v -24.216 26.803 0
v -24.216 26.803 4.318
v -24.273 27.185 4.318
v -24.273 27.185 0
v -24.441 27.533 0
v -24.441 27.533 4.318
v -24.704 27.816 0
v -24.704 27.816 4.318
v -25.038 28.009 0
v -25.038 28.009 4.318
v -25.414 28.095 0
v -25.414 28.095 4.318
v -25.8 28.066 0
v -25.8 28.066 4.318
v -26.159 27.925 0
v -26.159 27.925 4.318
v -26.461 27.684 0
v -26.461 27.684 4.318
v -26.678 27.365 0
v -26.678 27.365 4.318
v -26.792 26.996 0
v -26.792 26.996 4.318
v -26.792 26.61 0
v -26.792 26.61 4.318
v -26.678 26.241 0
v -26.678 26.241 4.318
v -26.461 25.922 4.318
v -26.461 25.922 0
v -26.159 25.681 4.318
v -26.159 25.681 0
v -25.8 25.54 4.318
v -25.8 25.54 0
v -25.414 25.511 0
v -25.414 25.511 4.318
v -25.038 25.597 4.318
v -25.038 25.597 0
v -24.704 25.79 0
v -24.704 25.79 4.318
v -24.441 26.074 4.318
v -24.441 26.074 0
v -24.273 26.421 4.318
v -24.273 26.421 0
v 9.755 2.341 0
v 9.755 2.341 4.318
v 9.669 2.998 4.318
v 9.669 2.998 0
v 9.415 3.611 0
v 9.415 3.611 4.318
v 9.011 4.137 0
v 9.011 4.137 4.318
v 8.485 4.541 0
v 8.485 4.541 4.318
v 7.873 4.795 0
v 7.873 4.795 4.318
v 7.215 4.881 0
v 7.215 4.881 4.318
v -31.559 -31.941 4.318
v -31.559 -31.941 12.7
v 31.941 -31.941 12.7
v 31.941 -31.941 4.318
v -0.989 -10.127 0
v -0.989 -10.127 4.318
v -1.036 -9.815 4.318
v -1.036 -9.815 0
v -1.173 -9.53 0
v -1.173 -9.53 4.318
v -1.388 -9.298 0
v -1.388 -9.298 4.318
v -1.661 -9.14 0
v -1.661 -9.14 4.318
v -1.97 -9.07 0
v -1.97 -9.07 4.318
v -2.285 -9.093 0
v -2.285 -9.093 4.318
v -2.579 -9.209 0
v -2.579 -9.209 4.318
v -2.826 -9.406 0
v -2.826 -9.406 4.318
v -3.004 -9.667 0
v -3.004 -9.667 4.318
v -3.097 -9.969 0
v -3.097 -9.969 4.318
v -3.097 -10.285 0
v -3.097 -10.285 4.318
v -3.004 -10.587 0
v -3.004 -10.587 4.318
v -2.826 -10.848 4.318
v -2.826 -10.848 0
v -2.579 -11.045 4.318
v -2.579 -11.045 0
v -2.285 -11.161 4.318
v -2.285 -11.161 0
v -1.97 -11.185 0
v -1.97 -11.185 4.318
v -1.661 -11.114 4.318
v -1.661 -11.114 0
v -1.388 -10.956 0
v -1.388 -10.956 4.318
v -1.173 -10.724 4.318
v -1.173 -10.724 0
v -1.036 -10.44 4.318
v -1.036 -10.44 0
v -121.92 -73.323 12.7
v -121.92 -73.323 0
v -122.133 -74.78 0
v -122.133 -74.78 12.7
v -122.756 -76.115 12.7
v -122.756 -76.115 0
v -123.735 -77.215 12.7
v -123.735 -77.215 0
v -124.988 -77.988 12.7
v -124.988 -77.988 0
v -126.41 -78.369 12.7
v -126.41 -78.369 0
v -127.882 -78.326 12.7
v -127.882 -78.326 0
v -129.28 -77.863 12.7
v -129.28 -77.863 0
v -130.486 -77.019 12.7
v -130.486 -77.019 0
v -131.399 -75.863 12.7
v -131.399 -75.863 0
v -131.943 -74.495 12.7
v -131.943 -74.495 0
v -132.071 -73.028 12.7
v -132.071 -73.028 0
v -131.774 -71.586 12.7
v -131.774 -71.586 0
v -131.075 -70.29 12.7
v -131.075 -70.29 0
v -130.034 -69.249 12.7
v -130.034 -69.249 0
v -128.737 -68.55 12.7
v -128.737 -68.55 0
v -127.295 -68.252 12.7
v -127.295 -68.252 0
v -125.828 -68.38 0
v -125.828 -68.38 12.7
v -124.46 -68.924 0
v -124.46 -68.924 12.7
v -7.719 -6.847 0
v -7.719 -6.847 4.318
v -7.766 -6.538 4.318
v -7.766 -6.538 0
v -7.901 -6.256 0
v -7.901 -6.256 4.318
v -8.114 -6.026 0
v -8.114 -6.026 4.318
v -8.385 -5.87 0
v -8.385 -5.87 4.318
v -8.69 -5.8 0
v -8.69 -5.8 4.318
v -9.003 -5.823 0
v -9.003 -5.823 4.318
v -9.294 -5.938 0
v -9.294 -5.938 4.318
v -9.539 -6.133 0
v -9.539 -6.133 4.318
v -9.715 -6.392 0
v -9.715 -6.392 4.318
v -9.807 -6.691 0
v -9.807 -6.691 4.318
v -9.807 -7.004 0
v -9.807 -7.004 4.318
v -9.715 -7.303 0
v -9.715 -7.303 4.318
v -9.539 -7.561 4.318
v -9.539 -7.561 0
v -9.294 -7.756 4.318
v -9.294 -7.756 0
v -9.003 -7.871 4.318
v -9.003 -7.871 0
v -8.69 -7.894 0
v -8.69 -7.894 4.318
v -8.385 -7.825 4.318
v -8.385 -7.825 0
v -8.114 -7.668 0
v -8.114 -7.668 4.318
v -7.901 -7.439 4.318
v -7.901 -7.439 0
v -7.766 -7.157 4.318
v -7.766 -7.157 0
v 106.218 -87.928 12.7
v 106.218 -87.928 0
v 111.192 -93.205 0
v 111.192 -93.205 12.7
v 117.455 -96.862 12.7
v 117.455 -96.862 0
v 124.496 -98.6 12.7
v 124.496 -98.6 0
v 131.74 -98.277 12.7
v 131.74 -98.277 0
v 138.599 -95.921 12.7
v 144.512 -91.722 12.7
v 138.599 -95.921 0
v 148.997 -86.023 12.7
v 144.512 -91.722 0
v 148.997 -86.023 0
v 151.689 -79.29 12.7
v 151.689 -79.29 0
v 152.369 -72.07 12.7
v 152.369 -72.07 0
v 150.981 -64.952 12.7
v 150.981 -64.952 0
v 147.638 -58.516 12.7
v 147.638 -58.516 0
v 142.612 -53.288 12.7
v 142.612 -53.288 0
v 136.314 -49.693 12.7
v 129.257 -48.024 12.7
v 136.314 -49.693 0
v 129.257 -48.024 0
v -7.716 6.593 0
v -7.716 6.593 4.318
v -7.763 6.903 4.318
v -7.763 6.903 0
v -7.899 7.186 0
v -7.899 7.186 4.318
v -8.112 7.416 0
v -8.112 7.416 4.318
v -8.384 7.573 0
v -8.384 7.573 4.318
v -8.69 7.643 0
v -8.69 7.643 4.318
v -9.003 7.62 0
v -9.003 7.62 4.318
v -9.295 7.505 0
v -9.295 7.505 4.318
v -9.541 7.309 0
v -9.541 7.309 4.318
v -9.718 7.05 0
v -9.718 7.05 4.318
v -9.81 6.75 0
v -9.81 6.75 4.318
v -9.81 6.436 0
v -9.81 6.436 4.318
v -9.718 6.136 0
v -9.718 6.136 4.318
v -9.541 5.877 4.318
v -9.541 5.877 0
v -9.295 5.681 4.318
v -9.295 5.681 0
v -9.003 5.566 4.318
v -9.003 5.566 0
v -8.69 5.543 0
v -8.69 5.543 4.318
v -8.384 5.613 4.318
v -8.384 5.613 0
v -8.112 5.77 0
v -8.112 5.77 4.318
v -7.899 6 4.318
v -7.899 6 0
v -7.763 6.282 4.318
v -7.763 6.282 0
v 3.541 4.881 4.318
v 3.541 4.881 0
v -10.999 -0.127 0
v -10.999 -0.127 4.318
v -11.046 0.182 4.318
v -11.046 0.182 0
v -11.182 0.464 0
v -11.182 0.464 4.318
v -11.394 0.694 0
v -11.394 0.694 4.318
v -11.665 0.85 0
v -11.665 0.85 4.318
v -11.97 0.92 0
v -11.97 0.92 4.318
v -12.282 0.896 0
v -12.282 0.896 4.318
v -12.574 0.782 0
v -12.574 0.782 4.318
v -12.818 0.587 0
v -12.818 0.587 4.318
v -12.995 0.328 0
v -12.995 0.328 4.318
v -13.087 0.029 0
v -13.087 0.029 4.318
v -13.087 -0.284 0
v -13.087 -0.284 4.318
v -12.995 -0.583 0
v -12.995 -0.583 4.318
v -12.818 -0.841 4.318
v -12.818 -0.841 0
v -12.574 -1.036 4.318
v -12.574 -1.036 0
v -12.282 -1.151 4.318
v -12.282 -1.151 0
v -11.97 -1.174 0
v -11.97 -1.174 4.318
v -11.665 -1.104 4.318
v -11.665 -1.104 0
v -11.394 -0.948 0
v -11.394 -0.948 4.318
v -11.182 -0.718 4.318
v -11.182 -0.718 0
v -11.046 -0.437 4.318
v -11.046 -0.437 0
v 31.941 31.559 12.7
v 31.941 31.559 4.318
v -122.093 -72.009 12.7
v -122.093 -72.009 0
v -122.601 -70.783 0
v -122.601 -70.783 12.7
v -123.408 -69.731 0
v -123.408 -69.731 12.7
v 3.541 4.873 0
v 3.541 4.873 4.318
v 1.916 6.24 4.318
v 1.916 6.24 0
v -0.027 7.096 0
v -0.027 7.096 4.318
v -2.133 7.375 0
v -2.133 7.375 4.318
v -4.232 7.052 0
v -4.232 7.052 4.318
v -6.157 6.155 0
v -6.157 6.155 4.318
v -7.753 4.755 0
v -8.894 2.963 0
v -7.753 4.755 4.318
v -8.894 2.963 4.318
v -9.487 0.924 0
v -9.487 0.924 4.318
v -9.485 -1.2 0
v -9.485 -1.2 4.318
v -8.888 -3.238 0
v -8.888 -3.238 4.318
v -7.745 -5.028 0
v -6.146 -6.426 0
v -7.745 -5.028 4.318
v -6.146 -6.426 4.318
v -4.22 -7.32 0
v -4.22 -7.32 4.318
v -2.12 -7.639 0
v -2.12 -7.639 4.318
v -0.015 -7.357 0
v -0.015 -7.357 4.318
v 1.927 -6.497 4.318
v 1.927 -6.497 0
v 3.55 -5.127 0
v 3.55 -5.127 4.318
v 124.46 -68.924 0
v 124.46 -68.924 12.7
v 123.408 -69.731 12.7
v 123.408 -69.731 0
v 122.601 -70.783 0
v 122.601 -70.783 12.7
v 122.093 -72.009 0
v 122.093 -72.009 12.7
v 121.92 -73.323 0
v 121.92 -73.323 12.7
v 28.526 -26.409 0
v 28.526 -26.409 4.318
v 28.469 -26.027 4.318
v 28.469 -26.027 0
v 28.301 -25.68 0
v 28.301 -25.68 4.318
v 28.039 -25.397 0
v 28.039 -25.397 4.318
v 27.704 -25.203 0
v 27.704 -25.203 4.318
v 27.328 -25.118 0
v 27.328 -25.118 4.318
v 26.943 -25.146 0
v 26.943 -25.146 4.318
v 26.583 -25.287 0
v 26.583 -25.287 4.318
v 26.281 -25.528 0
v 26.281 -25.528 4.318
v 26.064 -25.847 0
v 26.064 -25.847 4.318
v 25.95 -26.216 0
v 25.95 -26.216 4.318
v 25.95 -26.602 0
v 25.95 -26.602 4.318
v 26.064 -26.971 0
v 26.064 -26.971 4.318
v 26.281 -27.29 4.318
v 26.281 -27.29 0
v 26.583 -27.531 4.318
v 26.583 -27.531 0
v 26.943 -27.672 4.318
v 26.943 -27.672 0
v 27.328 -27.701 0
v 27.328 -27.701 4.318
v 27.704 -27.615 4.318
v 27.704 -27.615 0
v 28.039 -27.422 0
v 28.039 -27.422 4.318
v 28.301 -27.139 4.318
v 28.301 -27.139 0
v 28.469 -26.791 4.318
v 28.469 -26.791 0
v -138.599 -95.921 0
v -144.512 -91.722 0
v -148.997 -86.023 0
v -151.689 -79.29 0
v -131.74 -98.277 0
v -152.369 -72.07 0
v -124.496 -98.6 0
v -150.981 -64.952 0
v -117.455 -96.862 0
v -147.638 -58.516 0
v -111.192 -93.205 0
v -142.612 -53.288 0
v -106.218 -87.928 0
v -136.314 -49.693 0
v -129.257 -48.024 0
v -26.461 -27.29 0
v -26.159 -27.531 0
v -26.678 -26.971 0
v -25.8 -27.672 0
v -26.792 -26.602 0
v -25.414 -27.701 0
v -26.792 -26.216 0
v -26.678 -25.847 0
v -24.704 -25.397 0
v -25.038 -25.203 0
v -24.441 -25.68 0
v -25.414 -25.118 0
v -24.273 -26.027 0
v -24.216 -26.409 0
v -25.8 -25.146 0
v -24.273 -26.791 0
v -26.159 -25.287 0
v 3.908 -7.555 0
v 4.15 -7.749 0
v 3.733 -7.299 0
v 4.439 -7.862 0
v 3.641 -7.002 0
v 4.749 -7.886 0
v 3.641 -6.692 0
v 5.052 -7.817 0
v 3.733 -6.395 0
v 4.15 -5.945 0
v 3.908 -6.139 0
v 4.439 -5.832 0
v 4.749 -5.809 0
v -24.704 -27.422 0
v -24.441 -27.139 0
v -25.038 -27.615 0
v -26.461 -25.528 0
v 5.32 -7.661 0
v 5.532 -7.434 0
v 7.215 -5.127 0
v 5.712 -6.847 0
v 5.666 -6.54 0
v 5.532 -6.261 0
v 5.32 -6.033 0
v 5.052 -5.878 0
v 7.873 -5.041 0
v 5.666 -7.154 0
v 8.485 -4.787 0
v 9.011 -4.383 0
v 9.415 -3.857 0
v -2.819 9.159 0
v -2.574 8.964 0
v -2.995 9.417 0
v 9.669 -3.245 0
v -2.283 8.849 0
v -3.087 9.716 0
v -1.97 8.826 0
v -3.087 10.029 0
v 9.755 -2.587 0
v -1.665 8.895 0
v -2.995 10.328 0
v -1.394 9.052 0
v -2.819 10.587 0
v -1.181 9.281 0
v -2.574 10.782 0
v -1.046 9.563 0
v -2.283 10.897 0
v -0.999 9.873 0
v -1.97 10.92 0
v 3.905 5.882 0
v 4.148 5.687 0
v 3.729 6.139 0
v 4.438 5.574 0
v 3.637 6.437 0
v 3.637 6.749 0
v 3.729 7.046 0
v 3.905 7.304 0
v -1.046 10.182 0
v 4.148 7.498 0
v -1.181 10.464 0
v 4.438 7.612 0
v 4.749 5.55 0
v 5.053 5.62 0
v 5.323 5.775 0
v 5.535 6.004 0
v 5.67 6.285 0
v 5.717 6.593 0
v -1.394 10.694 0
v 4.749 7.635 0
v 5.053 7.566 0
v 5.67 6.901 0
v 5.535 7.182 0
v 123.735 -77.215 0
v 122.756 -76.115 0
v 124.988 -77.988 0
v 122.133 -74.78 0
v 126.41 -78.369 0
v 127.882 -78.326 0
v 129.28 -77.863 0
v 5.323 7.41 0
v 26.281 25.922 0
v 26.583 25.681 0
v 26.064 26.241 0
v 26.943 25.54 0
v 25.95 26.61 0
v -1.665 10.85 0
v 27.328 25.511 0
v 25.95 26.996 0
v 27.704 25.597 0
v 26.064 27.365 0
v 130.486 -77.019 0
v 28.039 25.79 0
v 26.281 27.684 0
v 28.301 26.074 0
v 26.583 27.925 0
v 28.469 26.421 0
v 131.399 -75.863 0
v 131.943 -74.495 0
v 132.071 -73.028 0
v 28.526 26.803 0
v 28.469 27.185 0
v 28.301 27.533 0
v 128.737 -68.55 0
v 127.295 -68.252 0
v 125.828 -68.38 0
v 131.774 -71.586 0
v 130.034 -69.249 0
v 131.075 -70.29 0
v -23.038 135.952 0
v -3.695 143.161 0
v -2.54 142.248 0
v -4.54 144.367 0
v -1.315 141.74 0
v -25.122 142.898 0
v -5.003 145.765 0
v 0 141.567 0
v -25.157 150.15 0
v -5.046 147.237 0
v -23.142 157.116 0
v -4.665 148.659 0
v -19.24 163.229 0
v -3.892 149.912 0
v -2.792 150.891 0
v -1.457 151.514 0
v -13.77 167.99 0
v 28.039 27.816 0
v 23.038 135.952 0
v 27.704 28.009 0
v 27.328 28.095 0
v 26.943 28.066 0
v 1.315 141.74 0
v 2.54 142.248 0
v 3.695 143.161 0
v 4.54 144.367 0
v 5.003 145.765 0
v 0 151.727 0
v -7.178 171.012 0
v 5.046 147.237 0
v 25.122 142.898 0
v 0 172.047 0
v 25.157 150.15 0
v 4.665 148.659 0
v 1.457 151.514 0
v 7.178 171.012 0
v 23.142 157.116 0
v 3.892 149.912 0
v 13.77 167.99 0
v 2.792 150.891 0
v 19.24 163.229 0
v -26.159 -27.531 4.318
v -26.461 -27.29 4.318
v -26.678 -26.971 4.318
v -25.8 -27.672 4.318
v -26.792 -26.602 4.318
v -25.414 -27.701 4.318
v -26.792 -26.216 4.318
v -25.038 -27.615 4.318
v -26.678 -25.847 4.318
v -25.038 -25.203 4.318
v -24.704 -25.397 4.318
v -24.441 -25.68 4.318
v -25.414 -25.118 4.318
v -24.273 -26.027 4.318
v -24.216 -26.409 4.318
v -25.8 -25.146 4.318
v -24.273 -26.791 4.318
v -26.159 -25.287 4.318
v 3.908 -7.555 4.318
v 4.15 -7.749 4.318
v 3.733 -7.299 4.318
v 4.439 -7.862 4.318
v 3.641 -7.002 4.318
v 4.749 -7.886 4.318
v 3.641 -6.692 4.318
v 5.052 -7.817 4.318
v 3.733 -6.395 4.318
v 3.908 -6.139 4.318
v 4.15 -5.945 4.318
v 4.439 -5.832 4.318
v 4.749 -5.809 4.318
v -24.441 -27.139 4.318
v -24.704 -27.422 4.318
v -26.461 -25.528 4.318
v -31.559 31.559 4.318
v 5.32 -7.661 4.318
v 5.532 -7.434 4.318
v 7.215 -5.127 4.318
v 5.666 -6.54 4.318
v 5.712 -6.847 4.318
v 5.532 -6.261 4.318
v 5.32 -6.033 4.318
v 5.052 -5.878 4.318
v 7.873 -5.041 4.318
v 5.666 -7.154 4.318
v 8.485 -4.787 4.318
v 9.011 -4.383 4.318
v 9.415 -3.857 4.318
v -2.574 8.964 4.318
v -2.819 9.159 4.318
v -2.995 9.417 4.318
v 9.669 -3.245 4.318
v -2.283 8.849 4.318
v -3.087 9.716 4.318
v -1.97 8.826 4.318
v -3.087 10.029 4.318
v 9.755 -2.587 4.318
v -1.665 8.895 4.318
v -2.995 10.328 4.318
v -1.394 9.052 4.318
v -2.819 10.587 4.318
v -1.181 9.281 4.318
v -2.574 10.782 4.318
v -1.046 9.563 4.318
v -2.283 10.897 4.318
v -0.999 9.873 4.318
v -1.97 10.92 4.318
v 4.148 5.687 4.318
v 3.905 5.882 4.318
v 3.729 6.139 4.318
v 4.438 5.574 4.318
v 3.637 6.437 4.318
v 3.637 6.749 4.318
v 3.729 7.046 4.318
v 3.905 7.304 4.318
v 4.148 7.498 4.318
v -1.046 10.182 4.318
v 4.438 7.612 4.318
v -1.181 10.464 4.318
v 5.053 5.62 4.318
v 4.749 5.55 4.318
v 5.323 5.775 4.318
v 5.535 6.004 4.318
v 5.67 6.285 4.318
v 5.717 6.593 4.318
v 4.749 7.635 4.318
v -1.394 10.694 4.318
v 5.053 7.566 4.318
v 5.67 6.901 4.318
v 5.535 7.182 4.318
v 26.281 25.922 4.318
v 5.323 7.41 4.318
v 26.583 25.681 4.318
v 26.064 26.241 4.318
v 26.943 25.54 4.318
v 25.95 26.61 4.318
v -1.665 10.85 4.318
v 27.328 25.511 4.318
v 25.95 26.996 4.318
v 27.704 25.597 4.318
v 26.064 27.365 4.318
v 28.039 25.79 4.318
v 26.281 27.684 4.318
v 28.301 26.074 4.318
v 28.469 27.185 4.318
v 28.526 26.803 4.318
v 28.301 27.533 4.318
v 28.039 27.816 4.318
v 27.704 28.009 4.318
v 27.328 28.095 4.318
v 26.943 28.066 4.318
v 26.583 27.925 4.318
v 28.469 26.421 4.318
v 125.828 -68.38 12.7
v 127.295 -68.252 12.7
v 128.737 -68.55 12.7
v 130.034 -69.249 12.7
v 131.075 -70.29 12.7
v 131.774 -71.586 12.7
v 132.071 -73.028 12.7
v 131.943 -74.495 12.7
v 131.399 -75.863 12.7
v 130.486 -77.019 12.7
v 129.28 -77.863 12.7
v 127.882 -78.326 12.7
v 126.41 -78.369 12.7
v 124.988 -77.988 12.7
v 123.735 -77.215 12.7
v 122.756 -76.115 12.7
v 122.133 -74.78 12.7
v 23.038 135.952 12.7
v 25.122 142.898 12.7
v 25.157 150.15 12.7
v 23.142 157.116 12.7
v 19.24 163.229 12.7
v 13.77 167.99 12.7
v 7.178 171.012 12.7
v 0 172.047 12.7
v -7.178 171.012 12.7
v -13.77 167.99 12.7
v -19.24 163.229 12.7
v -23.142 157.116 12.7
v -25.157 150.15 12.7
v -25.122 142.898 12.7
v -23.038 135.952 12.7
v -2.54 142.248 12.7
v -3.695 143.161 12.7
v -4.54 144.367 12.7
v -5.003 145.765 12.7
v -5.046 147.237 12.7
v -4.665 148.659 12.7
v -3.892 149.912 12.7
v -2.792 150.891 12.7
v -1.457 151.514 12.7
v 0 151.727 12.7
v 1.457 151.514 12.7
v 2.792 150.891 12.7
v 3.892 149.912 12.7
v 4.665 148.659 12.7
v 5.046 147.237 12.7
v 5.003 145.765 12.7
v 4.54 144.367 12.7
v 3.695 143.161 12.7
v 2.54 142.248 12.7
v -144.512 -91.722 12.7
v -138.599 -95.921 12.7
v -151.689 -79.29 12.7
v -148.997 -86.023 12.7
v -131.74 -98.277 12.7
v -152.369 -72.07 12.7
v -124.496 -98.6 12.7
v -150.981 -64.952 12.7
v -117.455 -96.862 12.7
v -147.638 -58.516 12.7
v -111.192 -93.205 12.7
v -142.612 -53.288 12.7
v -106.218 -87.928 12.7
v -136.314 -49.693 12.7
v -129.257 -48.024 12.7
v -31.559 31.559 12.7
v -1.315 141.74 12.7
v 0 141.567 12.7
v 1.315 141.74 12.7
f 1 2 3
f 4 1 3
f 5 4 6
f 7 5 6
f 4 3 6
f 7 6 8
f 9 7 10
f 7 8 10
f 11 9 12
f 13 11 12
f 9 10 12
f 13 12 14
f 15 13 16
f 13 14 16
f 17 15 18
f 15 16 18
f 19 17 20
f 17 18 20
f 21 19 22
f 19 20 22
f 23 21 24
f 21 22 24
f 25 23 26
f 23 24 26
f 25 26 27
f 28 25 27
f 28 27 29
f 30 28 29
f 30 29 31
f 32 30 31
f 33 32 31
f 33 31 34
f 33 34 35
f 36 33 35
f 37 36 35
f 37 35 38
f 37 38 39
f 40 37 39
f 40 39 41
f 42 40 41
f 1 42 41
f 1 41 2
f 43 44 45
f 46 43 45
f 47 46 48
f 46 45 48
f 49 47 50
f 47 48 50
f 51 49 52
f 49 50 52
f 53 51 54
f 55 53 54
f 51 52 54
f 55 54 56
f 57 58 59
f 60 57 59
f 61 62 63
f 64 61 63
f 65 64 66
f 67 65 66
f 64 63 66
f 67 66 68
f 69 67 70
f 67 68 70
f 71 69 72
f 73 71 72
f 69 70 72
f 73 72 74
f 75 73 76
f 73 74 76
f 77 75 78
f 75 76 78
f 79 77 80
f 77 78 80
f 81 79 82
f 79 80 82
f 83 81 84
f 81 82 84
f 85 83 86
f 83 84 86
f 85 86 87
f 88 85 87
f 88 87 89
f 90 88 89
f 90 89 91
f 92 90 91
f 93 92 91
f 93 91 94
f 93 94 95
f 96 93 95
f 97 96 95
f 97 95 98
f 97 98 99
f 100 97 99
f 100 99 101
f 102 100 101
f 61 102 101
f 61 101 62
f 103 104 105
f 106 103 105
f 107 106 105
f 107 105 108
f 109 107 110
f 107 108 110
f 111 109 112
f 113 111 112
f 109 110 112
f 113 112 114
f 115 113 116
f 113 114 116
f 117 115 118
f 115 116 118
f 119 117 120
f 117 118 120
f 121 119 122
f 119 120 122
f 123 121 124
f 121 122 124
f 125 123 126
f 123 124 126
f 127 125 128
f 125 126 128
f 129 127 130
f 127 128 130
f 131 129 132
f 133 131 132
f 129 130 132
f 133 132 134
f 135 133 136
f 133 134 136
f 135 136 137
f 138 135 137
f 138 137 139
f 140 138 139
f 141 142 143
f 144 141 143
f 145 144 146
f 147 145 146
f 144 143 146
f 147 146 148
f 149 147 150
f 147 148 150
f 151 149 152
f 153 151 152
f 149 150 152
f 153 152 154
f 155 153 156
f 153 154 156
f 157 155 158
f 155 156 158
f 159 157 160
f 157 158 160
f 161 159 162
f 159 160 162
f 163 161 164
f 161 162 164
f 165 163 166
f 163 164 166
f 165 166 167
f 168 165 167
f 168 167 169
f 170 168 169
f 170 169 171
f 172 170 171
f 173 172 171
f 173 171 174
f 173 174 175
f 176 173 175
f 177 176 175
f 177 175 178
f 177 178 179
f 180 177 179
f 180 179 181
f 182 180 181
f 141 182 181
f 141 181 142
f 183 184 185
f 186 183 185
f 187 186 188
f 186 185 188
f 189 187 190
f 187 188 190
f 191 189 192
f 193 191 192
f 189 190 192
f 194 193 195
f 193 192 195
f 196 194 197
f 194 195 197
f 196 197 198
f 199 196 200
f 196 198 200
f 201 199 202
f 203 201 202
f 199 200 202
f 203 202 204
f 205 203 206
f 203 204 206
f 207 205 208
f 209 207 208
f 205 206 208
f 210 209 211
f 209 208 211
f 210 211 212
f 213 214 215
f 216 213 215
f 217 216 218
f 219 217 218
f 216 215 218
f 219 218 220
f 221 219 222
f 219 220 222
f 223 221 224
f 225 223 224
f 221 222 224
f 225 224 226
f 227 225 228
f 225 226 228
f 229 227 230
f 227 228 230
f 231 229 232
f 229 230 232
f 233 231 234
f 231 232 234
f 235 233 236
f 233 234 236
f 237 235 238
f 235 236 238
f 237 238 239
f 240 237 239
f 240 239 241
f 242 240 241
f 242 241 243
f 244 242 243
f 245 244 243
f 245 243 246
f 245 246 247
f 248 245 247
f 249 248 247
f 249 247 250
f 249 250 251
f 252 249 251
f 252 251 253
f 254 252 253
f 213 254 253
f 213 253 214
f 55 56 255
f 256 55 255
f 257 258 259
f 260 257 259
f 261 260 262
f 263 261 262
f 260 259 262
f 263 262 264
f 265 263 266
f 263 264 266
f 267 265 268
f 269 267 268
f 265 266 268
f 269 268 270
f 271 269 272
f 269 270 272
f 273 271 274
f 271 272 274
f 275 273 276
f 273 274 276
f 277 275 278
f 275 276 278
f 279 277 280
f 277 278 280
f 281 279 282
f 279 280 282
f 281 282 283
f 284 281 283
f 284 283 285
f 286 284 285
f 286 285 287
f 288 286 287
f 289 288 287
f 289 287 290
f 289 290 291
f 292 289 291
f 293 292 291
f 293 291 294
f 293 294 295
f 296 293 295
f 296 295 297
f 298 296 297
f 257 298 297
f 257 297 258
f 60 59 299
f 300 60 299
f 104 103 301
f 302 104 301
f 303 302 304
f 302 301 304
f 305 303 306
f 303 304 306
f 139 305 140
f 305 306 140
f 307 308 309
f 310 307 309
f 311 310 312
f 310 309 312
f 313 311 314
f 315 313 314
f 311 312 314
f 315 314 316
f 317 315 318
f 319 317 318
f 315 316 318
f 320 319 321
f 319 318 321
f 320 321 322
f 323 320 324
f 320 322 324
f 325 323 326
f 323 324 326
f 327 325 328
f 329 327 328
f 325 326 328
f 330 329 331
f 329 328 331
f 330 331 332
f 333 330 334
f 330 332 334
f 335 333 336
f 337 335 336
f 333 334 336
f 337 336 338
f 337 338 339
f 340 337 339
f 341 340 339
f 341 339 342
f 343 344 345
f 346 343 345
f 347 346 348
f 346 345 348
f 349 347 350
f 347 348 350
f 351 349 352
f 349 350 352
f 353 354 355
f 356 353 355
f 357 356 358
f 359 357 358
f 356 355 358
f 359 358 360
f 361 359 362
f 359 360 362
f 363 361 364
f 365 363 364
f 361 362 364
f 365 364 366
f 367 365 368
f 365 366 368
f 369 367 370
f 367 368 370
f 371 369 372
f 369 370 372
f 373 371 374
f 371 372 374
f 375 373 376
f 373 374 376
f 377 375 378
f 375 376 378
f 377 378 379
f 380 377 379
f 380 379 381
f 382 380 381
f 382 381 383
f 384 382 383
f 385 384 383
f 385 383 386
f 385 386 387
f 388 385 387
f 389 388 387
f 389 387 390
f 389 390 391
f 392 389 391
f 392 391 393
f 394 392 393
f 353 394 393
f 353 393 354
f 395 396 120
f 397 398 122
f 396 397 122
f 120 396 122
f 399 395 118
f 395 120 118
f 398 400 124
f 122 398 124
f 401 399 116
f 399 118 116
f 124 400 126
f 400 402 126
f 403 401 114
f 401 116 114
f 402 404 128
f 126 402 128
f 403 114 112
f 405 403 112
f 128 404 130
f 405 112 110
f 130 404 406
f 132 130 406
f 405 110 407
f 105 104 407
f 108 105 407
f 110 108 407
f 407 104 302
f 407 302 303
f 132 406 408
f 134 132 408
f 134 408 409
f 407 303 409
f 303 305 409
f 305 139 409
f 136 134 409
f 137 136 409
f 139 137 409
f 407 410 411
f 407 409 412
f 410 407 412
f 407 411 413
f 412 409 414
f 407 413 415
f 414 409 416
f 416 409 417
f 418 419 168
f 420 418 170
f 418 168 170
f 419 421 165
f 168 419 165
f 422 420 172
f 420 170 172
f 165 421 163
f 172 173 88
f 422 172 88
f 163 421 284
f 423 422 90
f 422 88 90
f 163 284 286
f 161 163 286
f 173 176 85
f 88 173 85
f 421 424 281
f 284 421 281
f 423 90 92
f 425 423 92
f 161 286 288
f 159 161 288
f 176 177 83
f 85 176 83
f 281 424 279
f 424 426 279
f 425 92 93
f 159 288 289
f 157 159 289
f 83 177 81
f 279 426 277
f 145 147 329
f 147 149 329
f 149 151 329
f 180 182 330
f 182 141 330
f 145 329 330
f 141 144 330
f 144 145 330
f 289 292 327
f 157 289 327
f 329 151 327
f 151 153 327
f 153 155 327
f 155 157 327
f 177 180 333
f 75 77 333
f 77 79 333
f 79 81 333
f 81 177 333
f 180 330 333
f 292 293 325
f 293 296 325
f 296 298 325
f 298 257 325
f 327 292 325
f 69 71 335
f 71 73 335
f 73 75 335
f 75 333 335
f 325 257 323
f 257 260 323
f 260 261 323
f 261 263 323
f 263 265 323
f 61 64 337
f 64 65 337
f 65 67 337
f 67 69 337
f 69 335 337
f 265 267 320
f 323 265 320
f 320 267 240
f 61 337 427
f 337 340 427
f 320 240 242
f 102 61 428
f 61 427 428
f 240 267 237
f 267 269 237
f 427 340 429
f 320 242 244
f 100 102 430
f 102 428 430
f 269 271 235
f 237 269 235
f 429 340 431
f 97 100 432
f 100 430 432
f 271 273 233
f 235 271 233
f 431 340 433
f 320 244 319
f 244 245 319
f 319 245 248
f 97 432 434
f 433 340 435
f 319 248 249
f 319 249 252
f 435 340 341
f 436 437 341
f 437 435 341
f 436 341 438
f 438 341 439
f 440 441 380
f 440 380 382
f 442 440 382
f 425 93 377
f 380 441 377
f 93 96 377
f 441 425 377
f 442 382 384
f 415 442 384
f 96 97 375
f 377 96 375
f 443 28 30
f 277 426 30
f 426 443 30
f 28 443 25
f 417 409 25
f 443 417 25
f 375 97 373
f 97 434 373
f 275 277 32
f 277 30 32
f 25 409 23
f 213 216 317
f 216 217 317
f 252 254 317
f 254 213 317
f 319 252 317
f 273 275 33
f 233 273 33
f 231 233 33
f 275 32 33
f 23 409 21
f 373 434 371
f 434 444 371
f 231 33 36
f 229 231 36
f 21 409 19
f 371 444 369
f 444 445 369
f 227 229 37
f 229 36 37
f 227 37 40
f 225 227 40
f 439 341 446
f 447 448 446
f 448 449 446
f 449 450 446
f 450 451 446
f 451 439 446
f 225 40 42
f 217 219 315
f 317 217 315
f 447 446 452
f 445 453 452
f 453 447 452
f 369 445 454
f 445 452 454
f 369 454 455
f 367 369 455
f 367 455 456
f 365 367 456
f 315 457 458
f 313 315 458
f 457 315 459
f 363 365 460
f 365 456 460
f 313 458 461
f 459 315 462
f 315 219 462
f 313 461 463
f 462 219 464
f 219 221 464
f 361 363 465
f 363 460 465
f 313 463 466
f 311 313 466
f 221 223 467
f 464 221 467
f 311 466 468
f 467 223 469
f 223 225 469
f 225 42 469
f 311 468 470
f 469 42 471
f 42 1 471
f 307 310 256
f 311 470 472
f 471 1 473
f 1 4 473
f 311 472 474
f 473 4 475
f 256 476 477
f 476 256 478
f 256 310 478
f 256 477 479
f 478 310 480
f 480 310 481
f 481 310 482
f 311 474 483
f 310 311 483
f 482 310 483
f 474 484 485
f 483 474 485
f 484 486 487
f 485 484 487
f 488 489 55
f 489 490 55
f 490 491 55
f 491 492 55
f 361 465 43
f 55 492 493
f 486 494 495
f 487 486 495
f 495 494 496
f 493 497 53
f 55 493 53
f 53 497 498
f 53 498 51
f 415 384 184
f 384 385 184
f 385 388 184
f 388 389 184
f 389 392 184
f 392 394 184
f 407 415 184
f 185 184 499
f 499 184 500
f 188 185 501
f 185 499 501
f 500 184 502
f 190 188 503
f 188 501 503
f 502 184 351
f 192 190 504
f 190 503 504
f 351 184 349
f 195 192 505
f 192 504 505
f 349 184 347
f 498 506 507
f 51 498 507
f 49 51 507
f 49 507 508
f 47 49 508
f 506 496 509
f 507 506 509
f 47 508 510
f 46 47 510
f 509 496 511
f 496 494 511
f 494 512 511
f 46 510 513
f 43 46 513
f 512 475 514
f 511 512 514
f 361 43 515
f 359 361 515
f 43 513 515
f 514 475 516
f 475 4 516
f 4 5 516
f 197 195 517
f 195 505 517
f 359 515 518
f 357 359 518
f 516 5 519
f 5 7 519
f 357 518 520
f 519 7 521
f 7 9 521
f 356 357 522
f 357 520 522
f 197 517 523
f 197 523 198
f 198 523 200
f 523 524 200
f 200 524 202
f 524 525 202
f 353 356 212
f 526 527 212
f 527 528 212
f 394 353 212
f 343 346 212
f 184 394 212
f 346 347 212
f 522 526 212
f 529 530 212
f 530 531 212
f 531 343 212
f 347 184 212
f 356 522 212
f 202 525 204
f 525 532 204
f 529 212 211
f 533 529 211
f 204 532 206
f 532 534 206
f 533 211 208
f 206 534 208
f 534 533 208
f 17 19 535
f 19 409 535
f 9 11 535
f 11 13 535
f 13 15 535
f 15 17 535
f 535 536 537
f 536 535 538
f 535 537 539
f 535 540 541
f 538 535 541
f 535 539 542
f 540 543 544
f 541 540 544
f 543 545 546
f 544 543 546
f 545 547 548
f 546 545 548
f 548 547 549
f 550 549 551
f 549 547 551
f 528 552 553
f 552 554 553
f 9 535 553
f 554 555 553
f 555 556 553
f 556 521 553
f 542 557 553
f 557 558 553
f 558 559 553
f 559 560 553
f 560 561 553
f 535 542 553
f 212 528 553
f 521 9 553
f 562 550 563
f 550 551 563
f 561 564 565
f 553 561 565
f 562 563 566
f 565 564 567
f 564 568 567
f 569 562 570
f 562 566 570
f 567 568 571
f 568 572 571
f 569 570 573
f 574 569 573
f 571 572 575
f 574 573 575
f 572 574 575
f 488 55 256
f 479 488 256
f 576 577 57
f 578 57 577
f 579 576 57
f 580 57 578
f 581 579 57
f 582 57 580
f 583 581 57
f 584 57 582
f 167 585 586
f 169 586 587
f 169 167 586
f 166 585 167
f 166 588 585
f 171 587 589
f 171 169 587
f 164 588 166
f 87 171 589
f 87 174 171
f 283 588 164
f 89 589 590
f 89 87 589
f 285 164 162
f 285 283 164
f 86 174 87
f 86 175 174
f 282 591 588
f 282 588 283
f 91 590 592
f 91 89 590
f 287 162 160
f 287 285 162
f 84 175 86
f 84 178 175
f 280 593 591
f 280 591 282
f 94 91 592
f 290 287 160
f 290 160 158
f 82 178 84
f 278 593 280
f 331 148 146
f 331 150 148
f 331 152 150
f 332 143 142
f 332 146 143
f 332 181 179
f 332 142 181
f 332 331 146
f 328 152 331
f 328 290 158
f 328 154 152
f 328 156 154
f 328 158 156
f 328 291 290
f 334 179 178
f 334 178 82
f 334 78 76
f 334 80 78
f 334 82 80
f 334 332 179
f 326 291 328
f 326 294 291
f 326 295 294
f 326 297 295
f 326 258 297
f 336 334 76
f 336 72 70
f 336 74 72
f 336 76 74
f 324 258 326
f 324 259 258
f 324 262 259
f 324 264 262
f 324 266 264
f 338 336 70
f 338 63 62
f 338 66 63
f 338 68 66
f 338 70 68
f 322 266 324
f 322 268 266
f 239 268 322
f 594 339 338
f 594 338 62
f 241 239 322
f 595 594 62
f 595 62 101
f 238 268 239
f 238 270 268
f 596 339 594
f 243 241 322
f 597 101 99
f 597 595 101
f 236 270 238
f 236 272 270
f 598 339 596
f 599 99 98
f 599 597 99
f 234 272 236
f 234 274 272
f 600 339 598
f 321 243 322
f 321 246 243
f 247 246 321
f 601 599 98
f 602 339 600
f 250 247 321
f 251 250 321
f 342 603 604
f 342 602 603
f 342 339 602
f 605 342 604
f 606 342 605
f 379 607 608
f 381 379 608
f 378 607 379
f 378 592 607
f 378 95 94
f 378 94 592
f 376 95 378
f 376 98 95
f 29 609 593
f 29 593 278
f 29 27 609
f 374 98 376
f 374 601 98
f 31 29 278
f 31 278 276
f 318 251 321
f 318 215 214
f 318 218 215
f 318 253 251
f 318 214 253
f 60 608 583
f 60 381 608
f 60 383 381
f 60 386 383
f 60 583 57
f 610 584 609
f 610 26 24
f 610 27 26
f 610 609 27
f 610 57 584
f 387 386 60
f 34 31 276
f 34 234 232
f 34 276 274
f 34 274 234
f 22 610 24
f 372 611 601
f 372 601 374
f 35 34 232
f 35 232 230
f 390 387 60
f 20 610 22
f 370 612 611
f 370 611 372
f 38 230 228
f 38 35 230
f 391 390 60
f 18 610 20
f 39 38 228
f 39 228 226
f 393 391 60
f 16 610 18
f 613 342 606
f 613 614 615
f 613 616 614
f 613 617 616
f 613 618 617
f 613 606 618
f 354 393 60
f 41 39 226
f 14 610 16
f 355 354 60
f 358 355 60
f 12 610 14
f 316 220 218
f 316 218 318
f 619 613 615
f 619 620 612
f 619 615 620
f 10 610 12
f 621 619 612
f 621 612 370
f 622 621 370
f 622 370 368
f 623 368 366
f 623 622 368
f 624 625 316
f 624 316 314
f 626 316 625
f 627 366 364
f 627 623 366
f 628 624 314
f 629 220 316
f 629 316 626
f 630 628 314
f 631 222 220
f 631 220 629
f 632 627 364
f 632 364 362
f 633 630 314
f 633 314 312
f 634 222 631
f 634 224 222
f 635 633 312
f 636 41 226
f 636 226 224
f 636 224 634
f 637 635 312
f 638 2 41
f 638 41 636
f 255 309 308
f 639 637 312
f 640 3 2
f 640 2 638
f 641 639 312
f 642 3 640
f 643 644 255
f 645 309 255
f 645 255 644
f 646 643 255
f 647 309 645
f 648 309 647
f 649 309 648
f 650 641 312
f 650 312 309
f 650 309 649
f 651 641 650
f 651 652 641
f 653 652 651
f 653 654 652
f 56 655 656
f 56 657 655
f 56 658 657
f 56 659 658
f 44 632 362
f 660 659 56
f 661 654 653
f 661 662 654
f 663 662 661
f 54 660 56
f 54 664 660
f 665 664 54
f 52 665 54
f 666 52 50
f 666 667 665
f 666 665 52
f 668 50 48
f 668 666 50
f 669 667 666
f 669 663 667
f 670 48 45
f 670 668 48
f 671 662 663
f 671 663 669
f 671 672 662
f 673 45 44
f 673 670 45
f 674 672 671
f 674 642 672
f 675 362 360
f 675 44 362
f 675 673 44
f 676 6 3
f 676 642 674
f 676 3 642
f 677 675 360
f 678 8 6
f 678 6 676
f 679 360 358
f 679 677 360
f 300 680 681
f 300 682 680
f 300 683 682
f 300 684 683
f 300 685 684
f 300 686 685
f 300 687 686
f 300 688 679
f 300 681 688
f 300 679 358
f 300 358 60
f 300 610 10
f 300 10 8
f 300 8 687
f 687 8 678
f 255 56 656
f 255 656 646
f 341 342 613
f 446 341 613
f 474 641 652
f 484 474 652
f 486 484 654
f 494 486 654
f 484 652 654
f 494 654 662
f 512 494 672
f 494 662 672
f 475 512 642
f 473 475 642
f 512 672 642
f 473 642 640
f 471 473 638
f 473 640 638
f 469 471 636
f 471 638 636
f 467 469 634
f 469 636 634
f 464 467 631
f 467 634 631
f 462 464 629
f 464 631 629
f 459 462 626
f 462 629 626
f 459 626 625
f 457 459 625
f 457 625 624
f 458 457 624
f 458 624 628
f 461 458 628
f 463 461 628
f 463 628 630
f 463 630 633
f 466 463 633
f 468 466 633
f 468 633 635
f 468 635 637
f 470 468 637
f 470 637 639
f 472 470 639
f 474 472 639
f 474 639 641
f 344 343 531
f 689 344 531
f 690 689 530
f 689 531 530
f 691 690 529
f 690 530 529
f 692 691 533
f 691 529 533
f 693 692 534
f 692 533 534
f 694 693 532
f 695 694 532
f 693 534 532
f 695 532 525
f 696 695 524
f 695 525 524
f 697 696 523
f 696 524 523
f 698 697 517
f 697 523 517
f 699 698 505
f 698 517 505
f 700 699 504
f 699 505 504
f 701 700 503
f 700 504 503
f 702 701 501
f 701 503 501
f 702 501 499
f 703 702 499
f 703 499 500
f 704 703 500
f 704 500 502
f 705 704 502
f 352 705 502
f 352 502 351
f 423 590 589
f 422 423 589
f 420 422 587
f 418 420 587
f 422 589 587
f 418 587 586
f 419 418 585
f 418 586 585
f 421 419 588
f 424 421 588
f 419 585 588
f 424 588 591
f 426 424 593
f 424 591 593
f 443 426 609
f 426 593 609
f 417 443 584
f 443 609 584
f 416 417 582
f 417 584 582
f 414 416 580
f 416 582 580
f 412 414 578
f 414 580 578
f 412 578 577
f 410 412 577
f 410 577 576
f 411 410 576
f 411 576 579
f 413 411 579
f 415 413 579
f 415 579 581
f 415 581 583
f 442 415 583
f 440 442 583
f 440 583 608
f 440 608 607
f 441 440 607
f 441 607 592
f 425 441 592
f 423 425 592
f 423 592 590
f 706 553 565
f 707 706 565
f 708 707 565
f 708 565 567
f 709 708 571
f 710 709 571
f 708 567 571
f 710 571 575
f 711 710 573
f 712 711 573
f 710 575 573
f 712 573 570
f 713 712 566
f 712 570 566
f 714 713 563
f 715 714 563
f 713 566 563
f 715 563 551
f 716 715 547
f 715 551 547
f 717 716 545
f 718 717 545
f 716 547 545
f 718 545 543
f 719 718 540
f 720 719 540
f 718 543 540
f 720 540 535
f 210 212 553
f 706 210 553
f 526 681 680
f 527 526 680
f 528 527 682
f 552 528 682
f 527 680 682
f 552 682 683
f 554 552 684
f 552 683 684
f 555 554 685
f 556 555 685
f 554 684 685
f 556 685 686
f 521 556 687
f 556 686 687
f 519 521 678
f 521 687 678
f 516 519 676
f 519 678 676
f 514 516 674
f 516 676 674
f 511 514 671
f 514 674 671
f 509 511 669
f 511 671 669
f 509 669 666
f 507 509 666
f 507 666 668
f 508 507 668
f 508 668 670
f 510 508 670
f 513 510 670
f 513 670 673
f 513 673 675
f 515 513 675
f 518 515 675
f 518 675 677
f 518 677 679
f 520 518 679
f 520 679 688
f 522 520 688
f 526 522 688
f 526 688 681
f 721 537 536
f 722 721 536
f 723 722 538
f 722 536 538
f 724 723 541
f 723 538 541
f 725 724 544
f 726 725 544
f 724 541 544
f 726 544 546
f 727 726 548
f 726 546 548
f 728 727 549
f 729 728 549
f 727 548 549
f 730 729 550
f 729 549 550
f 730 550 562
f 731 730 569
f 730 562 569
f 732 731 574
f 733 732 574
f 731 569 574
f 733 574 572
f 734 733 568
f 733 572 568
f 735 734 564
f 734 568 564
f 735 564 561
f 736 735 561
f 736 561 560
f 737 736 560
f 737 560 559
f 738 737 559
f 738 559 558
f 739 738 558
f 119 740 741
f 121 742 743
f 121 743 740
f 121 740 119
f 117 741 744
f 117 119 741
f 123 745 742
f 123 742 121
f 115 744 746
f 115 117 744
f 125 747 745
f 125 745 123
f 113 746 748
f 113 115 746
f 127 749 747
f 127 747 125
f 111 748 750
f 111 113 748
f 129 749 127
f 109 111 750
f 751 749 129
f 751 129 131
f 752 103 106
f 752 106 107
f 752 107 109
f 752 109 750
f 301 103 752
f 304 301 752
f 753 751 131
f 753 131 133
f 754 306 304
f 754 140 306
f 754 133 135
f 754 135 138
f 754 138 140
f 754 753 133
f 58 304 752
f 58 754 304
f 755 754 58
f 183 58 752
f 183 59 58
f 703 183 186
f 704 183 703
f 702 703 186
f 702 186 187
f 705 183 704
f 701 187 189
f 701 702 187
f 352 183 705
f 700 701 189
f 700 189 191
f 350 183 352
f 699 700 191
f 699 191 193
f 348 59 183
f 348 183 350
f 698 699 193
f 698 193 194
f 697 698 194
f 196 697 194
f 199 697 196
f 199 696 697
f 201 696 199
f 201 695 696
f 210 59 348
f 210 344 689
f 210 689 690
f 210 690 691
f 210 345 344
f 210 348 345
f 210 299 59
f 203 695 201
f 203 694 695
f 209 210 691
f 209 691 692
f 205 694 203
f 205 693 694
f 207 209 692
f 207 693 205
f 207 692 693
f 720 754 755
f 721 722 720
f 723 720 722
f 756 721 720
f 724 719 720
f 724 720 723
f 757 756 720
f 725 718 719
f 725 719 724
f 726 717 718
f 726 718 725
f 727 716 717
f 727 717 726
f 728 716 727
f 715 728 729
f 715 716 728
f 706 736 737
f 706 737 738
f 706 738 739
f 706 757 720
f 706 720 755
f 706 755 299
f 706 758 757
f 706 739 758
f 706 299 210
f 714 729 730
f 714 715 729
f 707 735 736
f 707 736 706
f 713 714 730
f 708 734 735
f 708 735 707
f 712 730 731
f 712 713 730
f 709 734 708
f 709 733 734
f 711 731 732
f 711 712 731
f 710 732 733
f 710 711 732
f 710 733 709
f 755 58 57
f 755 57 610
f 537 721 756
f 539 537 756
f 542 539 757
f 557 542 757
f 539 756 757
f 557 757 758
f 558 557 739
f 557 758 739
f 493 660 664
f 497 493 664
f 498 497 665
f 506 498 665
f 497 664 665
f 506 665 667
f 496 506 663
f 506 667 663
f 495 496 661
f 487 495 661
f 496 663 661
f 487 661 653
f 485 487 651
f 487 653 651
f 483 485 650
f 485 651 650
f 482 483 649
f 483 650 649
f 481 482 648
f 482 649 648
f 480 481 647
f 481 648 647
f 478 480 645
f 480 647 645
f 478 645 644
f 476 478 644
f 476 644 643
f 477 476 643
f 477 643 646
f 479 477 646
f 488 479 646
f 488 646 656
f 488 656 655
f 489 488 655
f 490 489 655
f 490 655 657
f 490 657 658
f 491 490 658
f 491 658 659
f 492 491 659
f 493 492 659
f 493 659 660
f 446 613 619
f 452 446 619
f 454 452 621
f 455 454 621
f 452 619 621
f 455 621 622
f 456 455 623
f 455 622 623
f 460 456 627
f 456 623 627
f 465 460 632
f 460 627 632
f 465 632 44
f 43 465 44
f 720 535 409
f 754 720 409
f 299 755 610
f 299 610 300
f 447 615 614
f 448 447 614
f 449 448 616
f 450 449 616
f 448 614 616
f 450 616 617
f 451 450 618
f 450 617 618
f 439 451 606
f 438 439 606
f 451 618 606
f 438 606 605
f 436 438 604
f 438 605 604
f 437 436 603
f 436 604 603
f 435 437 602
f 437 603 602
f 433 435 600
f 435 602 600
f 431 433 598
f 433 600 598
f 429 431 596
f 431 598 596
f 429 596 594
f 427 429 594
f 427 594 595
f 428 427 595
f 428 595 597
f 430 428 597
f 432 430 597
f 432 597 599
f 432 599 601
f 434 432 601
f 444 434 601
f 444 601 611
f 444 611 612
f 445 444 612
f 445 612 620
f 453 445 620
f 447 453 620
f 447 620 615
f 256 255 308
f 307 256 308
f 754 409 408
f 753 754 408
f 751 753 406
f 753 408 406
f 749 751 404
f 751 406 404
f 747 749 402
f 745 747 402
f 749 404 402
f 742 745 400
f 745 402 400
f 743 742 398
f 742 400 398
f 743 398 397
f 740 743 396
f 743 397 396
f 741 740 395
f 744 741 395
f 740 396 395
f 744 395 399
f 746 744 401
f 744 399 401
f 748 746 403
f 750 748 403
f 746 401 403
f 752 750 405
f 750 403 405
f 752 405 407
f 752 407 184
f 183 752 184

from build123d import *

# Parameters (mm, degrees)
BOSS_EXTRUDE9_DEPTH      = 12.7
SKETCH2_R                = 5.08
CUT_EXTRUDE1_DEPTH       = 1
CUT_EXTRUDE1_DEPTH_BACK  = 13.7
SKETCH4_R                = 5.08
CUT_EXTRUDE3_DEPTH       = 13.7
SKETCH6_W                = 63.5
SKETCH6_H                = 63.5
CUT_EXTRUDE10_DEPTH      = 8.382
SKETCH8_R                = 1.2954
CUT_EXTRUDE13_DEPTH      = 5.318
SKETCH20_R               = 1.045475937
SKETCH20_R_2             = 1.05
SKETCH20_R_3             = 1.053113333
SKETCH20_R_4             = 1.049702702
SKETCH20_R_5             = 1.060351353
SKETCH20_R_6             = 1.041366857
CUT_EXTRUDE14_DEPTH      = 5.318
SKETCH22_R               = 7.507138663
CUT_EXTRUDE15_DEPTH      = 12.742239248
SKETCH26_R               = 5.08
CUT_EXTRUDE16_DEPTH      = 1
CUT_EXTRUDE16_DEPTH_BACK = 13.7


with BuildPart() as part:
    # Sketch1 → Boss-Extrude9 (new body)
    with BuildSketch(Plane.XY):
        with BuildLine():
            Line((129.25673796, -48.023936093), (23.038420334, 135.95158673))
            ThreePointArc((23.038420334, 135.95158673), (0, 172.046968374), (-23.038420334, 135.95158673))
            Line((-23.038420334, 135.95158673), (-129.25673796, -48.023936093))
            ThreePointArc((-129.25673796, -48.023936093), (-148.997045256, -86.023484187), (-106.218317626, -87.927650637))
            Line((-106.218317626, -87.927650637), (106.218317626, -87.927650637))
            ThreePointArc((106.218317626, -87.927650637), (148.997045256, -86.023484187), (129.25673796, -48.023936093))
        make_face()
        with BuildLine():
            ThreePointArc((-121.92, -73.323484187), (-131.399409051, -75.863484187), (-124.46, -68.924075136))
            Line((-124.46, -68.924075136), (-127, -73.323484187))
            Line((-127, -73.323484187), (-121.92, -73.323484187))
        make_face(mode=Mode.SUBTRACT)
        with BuildLine():
            ThreePointArc((124.46, -68.924075136), (131.399409051, -75.863484187), (121.92, -73.323484187))
            Line((121.92, -73.323484187), (127, -73.323484187))
            Line((127, -73.323484187), (124.46, -68.924075136))
        make_face(mode=Mode.SUBTRACT)
        with BuildLine():
            ThreePointArc((-2.54, 142.247559323), (0, 151.726968374), (2.54, 142.247559323))
            Line((2.54, 142.247559323), (0, 146.646968374))
            Line((0, 146.646968374), (-2.54, 142.247559323))
        make_face(mode=Mode.SUBTRACT)
    extrude(amount=BOSS_EXTRUDE9_DEPTH)

    # Sketch2 → Cut-Extrude1 (cut, two sides)
    with BuildSketch(Plane.XY.offset(12.7)) as cut_extrude1_sk:
        with Locations((127, -73.323484187)):
            Circle(SKETCH2_R)
    extrude(amount=CUT_EXTRUDE1_DEPTH, mode=Mode.SUBTRACT)
    extrude(cut_extrude1_sk.sketch, amount=-CUT_EXTRUDE1_DEPTH_BACK, mode=Mode.SUBTRACT)

    # Sketch4 → Cut-Extrude3 (cut, through all)
    with BuildSketch(Plane.XY.offset(12.7)):
        with Locations((0, 146.646968374)):
            Circle(SKETCH4_R)
    extrude(amount=-CUT_EXTRUDE3_DEPTH, mode=Mode.SUBTRACT)

    # Sketch6 → Cut-Extrude10 (cut)
    with BuildSketch(Plane.XY.offset(12.7)):
        with Locations((0.191375803, -0.191375803)):
            Rectangle(SKETCH6_W, SKETCH6_H)
    extrude(amount=-CUT_EXTRUDE10_DEPTH, mode=Mode.SUBTRACT)

    # Sketch8 → Cut-Extrude13 (cut, through all)
    with BuildSketch(Plane.XY.offset(4.318)):
        with Locations((-25.511301342, -26.409321294)):
            Circle(SKETCH8_R)
        with Locations((-25.511301342, 26.803242123)):
            Circle(SKETCH8_R)
        with Locations((27.230878657, 26.803242123)):
            Circle(SKETCH8_R)
        with Locations((27.230878657, -26.409321294)):
            Circle(SKETCH8_R)
    extrude(amount=-CUT_EXTRUDE13_DEPTH, mode=Mode.SUBTRACT)

    # Sketch20 → Cut-Extrude14 (cut, through all)
    with BuildSketch(Plane.XY.offset(4.318)):
        with Locations((4.671117374, 6.592866865)):
            Circle(SKETCH20_R)
        with Locations((-2.048882626, 9.872866865)):
            Circle(SKETCH20_R_2)
        with Locations((-8.768882626, 6.592866865)):
            Circle(SKETCH20_R_3)
        with Locations((-12.048882626, -0.127133135)):
            Circle(SKETCH20_R_4)
        with Locations((-2.048882626, -10.127133135)):
            Circle(SKETCH20_R_5)
        with Locations((-8.768882626, -6.847133135)):
            Circle(SKETCH20_R_2)
        with Locations((4.671117374, -6.847133135)):
            Circle(SKETCH20_R_6)
    extrude(amount=-CUT_EXTRUDE14_DEPTH, mode=Mode.SUBTRACT)

    # Sketch22 → Cut-Extrude15 (cut, through all)
    with BuildSketch(Plane.XY.offset(11.742239248)):
        with Locations((-2.054203471, -0.131892244)):
            Circle(SKETCH22_R)
        with BuildLine():
            Line((3.541287317, -5.127133135), (7.21512242, -5.127133135))
            ThreePointArc((7.21512242, -5.127133135), (9.011173644, -4.38318436), (9.75512242, -2.587133135))
            Line((9.75512242, -2.587133135), (9.75512242, 2.341072368))
            ThreePointArc((9.75512242, 2.341072368), (9.011173644, 4.137123592), (7.21512242, 4.881072368))
            Line((7.21512242, 4.881072368), (3.541287317, 4.881072368))
            Line((3.541287317, 4.881072368), (3.541287317, -5.127133135))
        make_face()
    extrude(amount=-CUT_EXTRUDE15_DEPTH, mode=Mode.SUBTRACT)

    # Sketch26 → Cut-Extrude16 (cut, two sides)
    with BuildSketch(Plane.XY.offset(12.7)) as cut_extrude16_sk:
        with Locations((-127, -73.323484187)):
            Circle(SKETCH26_R)
    extrude(amount=CUT_EXTRUDE16_DEPTH, mode=Mode.SUBTRACT)
    extrude(cut_extrude16_sk.sketch, amount=-CUT_EXTRUDE16_DEPTH_BACK, mode=Mode.SUBTRACT)


solid = part.part
